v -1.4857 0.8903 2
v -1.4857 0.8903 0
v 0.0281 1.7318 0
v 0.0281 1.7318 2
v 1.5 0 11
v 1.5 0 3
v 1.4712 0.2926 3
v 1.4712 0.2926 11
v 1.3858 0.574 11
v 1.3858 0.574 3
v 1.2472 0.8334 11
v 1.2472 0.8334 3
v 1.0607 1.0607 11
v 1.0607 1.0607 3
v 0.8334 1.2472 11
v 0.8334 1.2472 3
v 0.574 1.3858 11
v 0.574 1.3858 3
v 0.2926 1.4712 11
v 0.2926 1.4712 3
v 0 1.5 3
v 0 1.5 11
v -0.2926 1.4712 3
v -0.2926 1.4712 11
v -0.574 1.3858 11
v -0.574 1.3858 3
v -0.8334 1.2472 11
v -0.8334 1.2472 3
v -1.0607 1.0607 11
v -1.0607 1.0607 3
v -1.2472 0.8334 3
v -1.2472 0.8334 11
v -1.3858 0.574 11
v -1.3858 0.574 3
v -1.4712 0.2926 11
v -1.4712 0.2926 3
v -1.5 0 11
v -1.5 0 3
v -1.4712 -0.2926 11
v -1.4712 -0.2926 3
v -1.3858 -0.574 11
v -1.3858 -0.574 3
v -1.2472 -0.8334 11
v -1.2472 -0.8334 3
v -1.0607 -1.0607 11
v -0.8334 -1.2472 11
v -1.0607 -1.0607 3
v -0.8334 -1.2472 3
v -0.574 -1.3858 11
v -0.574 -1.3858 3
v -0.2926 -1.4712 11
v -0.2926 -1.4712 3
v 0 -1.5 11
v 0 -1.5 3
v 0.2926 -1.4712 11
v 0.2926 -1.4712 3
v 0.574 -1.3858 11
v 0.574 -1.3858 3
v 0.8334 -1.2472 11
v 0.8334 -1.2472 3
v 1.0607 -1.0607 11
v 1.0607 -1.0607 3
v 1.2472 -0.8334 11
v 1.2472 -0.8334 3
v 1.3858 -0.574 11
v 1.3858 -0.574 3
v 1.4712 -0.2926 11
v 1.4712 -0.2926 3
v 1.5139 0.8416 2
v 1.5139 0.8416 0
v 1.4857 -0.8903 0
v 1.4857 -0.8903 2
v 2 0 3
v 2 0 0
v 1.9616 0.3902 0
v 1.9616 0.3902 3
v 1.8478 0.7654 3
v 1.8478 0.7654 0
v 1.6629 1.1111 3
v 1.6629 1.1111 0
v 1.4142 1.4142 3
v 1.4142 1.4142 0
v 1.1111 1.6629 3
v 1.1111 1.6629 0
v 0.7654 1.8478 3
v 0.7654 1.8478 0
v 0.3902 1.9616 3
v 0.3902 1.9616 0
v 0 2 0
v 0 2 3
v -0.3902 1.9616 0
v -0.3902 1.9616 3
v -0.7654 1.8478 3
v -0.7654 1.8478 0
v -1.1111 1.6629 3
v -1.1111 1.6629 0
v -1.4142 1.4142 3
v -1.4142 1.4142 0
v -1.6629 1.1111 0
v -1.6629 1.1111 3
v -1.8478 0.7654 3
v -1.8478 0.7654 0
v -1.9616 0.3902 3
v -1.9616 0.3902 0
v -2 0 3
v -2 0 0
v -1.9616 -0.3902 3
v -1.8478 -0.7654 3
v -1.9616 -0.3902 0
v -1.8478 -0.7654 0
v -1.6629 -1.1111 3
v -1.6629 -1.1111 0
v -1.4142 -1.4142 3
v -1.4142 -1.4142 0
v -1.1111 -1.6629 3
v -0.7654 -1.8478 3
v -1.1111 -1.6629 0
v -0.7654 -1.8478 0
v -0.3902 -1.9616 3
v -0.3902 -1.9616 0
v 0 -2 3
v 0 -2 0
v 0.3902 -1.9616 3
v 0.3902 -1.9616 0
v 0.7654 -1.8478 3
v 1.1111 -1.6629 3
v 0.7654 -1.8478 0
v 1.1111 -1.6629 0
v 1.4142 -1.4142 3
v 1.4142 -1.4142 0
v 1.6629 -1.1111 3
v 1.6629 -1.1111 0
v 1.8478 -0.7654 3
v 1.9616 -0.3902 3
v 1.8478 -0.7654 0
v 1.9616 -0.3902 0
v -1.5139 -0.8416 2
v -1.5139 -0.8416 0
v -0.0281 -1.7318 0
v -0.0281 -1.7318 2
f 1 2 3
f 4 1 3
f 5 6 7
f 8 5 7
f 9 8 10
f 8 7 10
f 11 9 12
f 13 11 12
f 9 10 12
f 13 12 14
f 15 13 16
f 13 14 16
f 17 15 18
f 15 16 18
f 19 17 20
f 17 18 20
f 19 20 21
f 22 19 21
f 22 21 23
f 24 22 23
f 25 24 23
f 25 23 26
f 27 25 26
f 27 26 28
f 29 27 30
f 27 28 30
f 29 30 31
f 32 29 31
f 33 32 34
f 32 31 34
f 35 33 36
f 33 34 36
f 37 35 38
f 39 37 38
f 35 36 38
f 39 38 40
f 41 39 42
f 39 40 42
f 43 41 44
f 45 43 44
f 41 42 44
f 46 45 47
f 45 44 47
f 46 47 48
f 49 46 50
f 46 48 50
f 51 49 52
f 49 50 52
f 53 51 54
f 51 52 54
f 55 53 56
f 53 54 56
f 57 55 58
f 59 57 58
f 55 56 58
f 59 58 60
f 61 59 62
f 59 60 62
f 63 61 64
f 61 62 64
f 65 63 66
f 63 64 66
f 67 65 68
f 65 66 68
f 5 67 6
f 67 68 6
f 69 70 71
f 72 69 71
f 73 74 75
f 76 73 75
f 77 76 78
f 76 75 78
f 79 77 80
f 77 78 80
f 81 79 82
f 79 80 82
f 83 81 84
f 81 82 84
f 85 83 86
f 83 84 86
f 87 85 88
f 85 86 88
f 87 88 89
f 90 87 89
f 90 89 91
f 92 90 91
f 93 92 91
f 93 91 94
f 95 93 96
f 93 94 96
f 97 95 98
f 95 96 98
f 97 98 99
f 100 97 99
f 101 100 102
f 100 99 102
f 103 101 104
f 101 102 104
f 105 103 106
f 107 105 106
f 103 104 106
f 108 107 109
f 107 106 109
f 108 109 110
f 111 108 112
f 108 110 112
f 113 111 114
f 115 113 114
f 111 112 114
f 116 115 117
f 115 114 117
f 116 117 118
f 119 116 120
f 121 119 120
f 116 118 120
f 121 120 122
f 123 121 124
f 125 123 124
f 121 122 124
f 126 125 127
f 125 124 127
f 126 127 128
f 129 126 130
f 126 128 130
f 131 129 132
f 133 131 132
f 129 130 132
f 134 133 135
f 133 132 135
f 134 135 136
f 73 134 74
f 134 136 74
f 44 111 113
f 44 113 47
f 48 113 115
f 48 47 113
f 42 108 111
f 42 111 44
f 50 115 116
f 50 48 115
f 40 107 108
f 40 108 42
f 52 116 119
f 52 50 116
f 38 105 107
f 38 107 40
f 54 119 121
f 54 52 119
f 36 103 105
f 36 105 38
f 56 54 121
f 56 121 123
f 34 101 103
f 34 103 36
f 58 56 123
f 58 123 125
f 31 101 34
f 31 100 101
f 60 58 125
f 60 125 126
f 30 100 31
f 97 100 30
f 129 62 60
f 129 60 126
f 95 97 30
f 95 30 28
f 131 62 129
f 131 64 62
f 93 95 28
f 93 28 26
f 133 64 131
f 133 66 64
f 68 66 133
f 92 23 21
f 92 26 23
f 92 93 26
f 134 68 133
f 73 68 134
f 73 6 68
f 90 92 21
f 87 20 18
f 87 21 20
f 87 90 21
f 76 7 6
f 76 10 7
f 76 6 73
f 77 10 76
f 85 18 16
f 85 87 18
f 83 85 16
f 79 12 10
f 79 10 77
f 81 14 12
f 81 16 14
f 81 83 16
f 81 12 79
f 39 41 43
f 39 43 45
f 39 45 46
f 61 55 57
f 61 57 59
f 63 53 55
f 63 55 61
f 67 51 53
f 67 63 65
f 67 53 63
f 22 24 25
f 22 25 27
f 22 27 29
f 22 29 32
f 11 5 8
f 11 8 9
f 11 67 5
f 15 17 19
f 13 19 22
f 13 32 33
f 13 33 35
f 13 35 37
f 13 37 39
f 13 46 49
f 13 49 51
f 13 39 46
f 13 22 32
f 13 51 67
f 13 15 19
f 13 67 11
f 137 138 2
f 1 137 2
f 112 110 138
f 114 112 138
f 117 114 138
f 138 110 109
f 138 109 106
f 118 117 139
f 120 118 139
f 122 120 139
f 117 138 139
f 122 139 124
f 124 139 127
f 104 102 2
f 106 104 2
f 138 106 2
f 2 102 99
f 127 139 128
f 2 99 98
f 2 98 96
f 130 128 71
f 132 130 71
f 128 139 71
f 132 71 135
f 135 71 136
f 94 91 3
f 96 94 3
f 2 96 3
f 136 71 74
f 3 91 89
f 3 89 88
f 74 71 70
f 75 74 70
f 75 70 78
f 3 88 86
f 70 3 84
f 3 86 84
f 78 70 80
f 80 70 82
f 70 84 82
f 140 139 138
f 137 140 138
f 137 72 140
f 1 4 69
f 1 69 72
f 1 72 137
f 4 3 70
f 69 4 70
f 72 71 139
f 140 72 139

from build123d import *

# Parameters (mm, degrees)
SKETCH_1_R          = 2
EXTRUDE_1_DEPTH     = 3
SKETCH_2_R          = 1.5
EXTRUDE_2_DEPTH     = 8
CUT_EXTRUDE_1_DEPTH = 2


with BuildPart() as part:
    # 草图1 → 凸台-拉伸1 (new body)
    with BuildSketch(Plane.XY):
        Circle(SKETCH_1_R)
    extrude(amount=EXTRUDE_1_DEPTH)

    # 草图2 → 凸台-拉伸2 (add)
    with BuildSketch(Plane.XY.offset(3)):
        Circle(SKETCH_2_R)
    extrude(amount=EXTRUDE_2_DEPTH)

    # 草图3 → 切除-拉伸1 (cut)
    with BuildSketch(Plane(origin=(0, 0, 0), x_dir=(-1, 0, 0), z_dir=(0, 0, -1))):
        Polygon((1.513862997, -0.841557381), (1.485741569, 0.890265123), (-0.028121428, 1.731822504), (-1.513862997, 0.841557381), (-1.485741569, -0.890265123), (0.028121428, -1.731822504), align=None)
    extrude(amount=-CUT_EXTRUDE_1_DEPTH, mode=Mode.SUBTRACT)


solid = part.part
